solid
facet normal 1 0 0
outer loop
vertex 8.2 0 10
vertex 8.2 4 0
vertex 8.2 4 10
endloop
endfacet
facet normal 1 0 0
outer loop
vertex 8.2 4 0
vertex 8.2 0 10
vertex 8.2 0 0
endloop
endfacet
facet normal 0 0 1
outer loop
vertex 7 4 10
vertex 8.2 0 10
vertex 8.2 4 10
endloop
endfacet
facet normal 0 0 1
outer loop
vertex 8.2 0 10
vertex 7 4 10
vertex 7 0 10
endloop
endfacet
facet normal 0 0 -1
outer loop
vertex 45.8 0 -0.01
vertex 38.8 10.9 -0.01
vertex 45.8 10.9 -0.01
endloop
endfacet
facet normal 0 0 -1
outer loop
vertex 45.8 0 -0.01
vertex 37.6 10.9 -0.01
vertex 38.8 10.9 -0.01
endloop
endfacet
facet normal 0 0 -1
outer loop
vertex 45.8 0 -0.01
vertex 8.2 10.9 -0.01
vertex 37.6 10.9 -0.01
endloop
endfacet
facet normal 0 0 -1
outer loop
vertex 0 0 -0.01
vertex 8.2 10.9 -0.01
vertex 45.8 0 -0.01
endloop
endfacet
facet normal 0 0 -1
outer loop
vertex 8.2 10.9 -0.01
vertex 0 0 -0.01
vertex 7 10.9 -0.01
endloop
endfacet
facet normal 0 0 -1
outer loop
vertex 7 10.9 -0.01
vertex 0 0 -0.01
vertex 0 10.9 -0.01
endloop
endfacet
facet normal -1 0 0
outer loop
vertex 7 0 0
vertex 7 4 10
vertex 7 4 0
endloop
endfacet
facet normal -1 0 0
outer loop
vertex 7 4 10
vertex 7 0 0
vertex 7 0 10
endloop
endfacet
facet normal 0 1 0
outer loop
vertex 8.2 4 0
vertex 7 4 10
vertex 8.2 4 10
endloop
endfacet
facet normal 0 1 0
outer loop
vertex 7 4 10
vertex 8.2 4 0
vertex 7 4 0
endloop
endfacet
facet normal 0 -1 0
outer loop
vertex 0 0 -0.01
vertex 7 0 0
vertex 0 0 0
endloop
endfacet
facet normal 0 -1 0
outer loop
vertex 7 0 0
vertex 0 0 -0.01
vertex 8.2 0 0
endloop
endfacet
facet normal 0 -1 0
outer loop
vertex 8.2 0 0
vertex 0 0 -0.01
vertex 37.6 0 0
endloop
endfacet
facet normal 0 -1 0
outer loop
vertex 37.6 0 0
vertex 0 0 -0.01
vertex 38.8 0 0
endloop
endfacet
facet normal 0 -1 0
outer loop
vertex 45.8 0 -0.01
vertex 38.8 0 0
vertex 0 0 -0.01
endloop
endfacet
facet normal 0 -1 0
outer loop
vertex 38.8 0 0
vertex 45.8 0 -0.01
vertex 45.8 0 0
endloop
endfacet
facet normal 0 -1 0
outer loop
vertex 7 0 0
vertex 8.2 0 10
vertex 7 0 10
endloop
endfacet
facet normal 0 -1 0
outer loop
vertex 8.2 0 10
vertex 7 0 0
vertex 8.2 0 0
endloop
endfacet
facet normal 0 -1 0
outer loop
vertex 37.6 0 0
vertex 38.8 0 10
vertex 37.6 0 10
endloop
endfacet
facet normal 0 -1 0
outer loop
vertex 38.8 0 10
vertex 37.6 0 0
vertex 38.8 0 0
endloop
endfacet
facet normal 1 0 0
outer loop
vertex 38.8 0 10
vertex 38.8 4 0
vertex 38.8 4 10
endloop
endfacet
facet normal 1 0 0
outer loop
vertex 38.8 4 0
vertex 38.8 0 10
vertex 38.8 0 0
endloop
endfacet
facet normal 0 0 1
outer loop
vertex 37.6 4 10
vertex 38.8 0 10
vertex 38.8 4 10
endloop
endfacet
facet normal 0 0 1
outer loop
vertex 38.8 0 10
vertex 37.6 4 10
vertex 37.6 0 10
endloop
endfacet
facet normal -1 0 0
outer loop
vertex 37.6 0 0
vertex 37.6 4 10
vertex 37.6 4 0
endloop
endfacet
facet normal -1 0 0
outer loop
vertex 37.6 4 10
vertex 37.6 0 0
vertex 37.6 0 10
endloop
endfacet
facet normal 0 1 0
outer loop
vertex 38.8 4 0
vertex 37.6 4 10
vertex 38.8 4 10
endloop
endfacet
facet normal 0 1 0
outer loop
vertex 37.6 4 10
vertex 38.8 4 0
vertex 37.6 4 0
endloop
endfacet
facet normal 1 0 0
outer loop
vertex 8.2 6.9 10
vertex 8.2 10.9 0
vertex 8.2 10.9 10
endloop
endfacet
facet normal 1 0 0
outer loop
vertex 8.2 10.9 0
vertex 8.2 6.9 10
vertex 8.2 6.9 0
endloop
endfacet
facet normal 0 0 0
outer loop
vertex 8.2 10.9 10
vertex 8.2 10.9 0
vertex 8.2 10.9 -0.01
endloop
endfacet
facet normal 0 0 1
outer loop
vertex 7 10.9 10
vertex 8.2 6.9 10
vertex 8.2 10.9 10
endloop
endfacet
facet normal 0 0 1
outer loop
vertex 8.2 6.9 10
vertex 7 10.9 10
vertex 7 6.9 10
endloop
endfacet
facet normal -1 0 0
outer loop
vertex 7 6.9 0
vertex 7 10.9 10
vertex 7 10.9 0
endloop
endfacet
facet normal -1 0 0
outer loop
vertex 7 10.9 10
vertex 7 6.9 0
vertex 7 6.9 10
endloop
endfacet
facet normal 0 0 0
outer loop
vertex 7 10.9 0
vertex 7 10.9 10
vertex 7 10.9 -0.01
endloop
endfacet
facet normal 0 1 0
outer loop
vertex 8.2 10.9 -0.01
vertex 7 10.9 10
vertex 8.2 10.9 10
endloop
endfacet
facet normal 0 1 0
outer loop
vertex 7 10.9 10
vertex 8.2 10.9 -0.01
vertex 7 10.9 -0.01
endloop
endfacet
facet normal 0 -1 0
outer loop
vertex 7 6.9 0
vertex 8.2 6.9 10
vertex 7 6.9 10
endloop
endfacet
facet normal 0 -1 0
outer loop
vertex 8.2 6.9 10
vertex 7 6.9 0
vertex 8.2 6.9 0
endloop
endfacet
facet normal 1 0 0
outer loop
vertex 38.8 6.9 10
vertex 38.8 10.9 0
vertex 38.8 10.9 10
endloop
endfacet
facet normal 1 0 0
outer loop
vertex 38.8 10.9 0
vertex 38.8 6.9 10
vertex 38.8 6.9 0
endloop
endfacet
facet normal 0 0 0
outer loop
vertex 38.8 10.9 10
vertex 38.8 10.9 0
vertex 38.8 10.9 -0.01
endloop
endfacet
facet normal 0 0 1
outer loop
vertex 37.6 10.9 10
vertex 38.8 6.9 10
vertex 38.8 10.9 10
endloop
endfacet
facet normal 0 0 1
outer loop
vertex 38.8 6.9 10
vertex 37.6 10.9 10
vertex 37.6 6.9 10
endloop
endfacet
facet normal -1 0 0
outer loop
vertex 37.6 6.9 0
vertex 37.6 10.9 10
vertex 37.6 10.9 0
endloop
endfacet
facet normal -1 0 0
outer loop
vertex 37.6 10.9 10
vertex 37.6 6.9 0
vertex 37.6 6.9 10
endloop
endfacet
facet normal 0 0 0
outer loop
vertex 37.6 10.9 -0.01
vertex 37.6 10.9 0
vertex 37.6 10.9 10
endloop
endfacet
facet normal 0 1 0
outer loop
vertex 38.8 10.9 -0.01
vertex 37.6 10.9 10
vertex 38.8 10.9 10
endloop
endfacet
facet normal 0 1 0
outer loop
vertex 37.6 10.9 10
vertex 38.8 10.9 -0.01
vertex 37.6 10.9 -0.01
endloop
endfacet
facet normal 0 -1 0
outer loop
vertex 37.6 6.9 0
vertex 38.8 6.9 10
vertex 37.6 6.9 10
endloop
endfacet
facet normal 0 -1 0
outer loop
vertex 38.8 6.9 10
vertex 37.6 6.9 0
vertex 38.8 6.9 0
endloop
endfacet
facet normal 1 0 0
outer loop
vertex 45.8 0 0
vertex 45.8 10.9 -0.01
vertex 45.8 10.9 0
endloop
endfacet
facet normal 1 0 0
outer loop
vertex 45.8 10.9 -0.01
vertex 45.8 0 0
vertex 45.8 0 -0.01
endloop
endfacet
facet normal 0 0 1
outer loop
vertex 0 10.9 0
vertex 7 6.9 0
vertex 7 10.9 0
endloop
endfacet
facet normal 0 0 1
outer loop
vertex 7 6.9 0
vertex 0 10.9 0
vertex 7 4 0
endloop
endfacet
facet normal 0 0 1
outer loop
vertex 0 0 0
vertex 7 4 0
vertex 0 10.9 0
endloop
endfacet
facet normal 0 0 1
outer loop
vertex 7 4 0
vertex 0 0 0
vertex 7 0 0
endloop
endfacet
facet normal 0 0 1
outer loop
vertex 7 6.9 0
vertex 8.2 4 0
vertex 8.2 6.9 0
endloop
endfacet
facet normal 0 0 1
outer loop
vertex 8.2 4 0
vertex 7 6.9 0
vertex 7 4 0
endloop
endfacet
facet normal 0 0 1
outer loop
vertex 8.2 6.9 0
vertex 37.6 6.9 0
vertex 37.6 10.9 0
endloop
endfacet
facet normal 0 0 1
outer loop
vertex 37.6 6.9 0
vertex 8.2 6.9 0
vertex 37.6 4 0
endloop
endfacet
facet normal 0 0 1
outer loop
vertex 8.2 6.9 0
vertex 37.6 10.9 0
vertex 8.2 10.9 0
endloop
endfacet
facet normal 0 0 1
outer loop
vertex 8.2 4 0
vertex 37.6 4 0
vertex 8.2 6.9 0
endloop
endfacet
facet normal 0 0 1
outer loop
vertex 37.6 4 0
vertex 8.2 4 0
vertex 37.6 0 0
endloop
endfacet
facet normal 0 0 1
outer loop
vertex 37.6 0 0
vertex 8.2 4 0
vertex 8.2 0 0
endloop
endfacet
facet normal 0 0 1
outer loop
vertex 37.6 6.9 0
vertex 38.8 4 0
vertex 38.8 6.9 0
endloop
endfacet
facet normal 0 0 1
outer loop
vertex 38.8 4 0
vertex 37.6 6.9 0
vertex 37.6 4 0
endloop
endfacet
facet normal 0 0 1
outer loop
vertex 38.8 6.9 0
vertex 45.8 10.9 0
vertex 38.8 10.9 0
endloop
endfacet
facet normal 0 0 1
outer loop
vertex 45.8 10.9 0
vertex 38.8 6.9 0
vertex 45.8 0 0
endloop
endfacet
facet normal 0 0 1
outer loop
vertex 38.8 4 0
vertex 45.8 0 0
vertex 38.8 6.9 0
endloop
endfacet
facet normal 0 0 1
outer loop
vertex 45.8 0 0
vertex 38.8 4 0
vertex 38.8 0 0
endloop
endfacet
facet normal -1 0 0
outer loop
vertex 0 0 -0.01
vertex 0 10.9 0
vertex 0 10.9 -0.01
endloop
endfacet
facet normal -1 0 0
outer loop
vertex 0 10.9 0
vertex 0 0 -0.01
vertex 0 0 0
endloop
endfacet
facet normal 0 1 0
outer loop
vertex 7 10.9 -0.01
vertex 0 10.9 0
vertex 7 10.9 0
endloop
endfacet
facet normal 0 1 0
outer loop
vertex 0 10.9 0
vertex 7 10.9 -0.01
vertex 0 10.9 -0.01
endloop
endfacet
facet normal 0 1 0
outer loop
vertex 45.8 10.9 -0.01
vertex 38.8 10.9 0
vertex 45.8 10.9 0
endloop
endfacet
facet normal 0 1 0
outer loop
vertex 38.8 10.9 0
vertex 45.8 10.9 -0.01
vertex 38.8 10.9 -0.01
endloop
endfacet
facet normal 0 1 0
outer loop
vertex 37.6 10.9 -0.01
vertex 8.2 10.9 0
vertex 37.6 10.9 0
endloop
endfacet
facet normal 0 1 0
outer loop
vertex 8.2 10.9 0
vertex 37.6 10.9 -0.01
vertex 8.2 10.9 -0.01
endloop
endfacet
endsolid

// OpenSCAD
// file: ../Base/Boxes.scad
// Fischertechnik Box Foundation
// Pre-designed Boxes

use <Constants.scad>

include <PlacementOptions.scad>

box190Width = 190;
box190Depth = 130;
box130Width = 130;
box130Depth = 95;
boxUsageHeight = 33.9;
boxWallThickness = 2.4;
boxBaseThickness = 1.0;
boxWebWidth = 3.0;

// getBoxWallThickness()
// Gets the wall thickness of a Fischertechnik Box

function getBoxWallThickness() = boxWallThickness;

// Gets the usable height of a fischertechnik box
function getBoxUsageHeight() = boxUsageHeight;

// Gets the thickness of the Fischertechnik box base.
function getBoxBaseThickness() = boxBaseThickness;

// Gets the width of a box web
function getBoxWebWidth() = boxWebWidth;

// Gets the usable inner space of a Box 190 as an x/y-list
function getBox190Space() = [
    box190Width - 2*getBoxWallThickness(), 
    box190Depth - 2*getBoxWallThickness() ];

// Imports the Fischertechnik empty box 130x190 mm and places it at position 0,0
// 190x130 are the outer sizes, the inner space is slightly smaller. Use getBox190Space() to get the inner sizes.
// This module needs the STL file "Fischertechnik Box 130x190.stl" in the library path.
// The box is positioned that the usable inner space is at the 0,0,0 position. The

module Box190() {
    translate([-getBoxWallThickness(),-getBoxWallThickness(),-getBoxBaseThickness()])
        import("Fischertechnik Box 130x190.stl", convexity=3);
}

// Gets the usable inner space of a Box 130 as an x/y-list
function getBox130Space() = [
    box130Width - 2*getBoxWallThickness(), 
    box130Depth - 2*getBoxWallThickness() ];

// Imports the Fischertechnik empty box 95x130 mm and places it at position 0,0
// 190x130 are the outer sizes, the inner space is slightly smaller. Use getBox190Space() to get the inner sizes.
// This module needs the STL file "Fischertechnik Box 95x130.stl" in the library path.
// The box is positioned that the usable inner space is at the 0,0,0 position. The

module Box130() {
    translate([-getBoxWallThickness(),-getBoxWallThickness(),-getBoxBaseThickness()])
        import("Fischertechnik Box 95x130.stl", convexity=3);
}

// Creates a web at the specified box walls
// corner 0 = LowerLeft, 1 = UpperLeft, 2 = UpperRight, 3 = LowerRight
// side 0 = LeftOfCorner, 1 = RightOfCorner
// distance = Distance in mm from the corner
// box = inner width and depth of the box (default: Box 190)
// webWidth = length of the web (default is 3 mms)
// webThickness = thickness of the web (default is 1 mm)

module BoxWeb(corner, side, distance, box=getBox190Space(), webWidth=getBoxWebWidth(), webThickness=1.0) {
    sink = getBoxWallThickness()/2;

    width = (corner % 2 == 0) ? 
            (side == LeftOfCorner ? webWidth : webThickness) :
            (side == LeftOfCorner ? webThickness : webWidth);

    depth = (corner % 2 == 0) ? 
            (side == RightOfCorner ? webWidth : webThickness) :
            (side == RightOfCorner ? webThickness : webWidth);
    
    xDiff = corner == LowerLeft ? 
                (side == LeftOfCorner ? -sink : distance) :
            (corner == UpperLeft ?                
                (side == LeftOfCorner ? distance : -sink) :
            (corner == UpperRight ?
                (side == LeftOfCorner ? box.x-webWidth+sink : box.x-distance-webThickness) :
                (side == LeftOfCorner ? box.x-distance-webThickness: box.x-webWidth+sink)));

    yDiff = corner == LowerLeft ? 
                (side == RightOfCorner ? -sink : distance) :
            (corner == UpperLeft ?
                (side == RightOfCorner ? box.y-distance : box.y-webWidth+sink) :
            (corner == UpperRight ?
                (side == RightOfCorner ? box.y-webWidth+sink : box.y-distance) :
                (side == RightOfCorner ? distance : -sink)));
    
    translate([xDiff, yDiff, -getExcess()])
        cube([width, depth, boxUsageHeight + 2*getExcess()]);
}
// file: ../Base/Rotation.scad
// Fischertechnik Box Foundation
// Geometry Helpers Rotation

include <PlacementOptions.scad>

// getRotatedSpace(space, rotation=NoRotation)
// Rotates the space dependent on the specified rotation

function getRotatedSpace(space, rotation=NoRotation) = [
    (rotation == Rotate90 || rotation == Rotate270) ? space.y : space.x,
    (rotation == Rotate90 || rotation == Rotate270) ? space.x : space.y
];

// Rotates the given space around the fixed left lower corner
// space = the space the children needs as width/depth list [width,depth]
// rotation = 0 Rotate0 degrees, 1 Rotate90 degrees, 2 Rotate180 degrees, 3 Rotate270 degrees (equivalent to -90)

module RotateFix(space, rotation=Rotate0) {
    dy = (rotation == Rotate0 || rotation == Rotate270) ? 0 :
        (rotation == Rotate90) ? space.x :
        space.y;
    dx = (rotation < Rotate180) ? 0 :
        (rotation == Rotate180) ? space.x :
        space.y;
    
    translate([dx, dy, 0])
        rotate([0, 0, rotations[rotation]])
            children();
}
// file: ../Base/Alignment.scad
// Fischertechnik Box Foundation
// Geometry Helpers Alignment

include <PlacementOptions.scad>

// getAlignedX(elementWidth, spaceWidth, align=AlignRight, offset=0)
// Gets the aligned X offset of an element with the given
// width in the given space.
// elementWidth = The width of the element to positon
// spaceWidth = The space where the element should be aligned
// align = 0 AlignLeft, 1 AlignCenter, 2 AlignRight
// offset = an optional offset from the aligned position. When
// aligned left or centered, then positive values are in X direction.
// When aligned right then positive values are in negative X direction.

function getAlignedX(elementWidth, spaceWidth, align=AlignRight, offset=0) =
    (align == AlignLeft) ?
        offset :
        ((align == AlignCenter) ?
        (spaceWidth - elementWidth)/2 + offset :
        spaceWidth - offset - elementWidth);

// getAlignedY(elementDepth, spaceDepth, align=AlignTop, offset=0)
// Gets the aligned Y offset of an element with the given
// depth in the given space.
// elementDepth = The depth of the element to positon
// spaceDepth = The space where the element should be aligned
// align = 0 AlignBottom, 1 AlignCenter, 2 AlignTop
// offset = an optional offset from the aligned position. When
// aligned bottom or centered, then positive values are in Y direction.
// When aligned top then positive values are in negative Y direction.

function getAlignedY(elementDepth, spaceDepth, align=AlignTop, offset=0) =
    (align == AlignBottom) ?
        offset :
        ((align == AlignCenter) ?
        (spaceDepth - elementDepth)/2 + offset :
        spaceDepth - offset - elementDepth);
// file: ../Base/PlacementOptions.scad
// Fischertechnik Box Foundation
// Placement Options

// Alignment
NoAlign = 0;
AlignLeft = 1;
AlignBottom = 2;
AlignCenter = 3;
AlignRight = 4;
AlignTop = 5;

// Element rotation degree steps
rotations = [0, -90, -180, -270];

// Rotation
NoRotation = 0;
Rotate0 = 0;
Rotate90 = 1;
Rotate180 = 2;
Rotate270 = 3;

// Docking (seen from above)
NoDock = -1;
DockLeft = 0;
DockTop = 1;
DockRight = 2;
DockCorner = 2;
DockBottom = 3;

// Web corners
LowerLeft = 0;
UpperLeft = 1;
UpperRight = 2;
LowerRight = 3;

// Web position relative to corner
LeftOfCorner = 0;
RightOfCorner = 1;
// file: ../Base/Placement.scad
// Fischertechnik Box Foundation
// Geometry Helpers Placement

use <Constants.scad>
use <Alignment.scad>
use <Rotation.scad>
use <Boxes.scad>

include <PlacementOptions.scad>

// Place(x=0, y=0, elementSpace=[0,0], alignX=AlignLeft, alignY=AlignBottom, rotation=Rotate0, boxSpace=getBox190Space())
// Places the child at the specified position
// y = Y-Position. This is a relative position when an X aligment is specified.
// x = X-Position. This is a relative position when an Y aligment is specified.
// elementSpace = space of the element to be placed [x,y]
// alignX = -1=NoAlign, 0 AlignLeft, 1 AlignCenter, 3 AlignRight (elementSpace and boxSpace required!)
// alignY = -1=NoAlign, 2 AlignBottom, 1 AlignCenter, 4 AlignTop (elementSpace and boxSpace required!)
// rotation = 0 Rotate0 0 degrees, 1 Rotate90 90 degrees, 
// 2 Rotate180 180 degrees, 3 Rotate270 270 degrees (equivalent to -90)
// boxSpace = Inner space of the box where the placement occurs [x,y] - default is Box 190x130 inner space

module Place(x=0, y=0, elementSpace=[0,0], 
  alignX=AlignLeft, alignY=AlignBottom, 
  rotation=NoRotation, boxSpace=getBox190Space()) {

    module Position(x, y, space, rotation=Rotate0) {
        translate([x, y, 0])
            RotateFix(space, rotation)
                children();
    }

    space = getRotatedSpace(elementSpace, rotation);
    alignedX = getAlignedX(space.x, boxSpace.x, alignX, x);
    alignedY = getAlignedY(space.y, boxSpace.y, alignY, y);
    Position(alignedX, alignedY, elementSpace, rotation)
        children();
}

// Center(space=getBox130Space(), elementSpace=[0,0])
// space = Space where the children is centered. For cylinder use centered=true and no elementSpace.
// elementSpace = space of the element to be centered [x,y]

module Center(space=getBox190Space(), elementSpace=[0,0]) {
    translate([(space.x - elementSpace.x) / 2, (space.y - elementSpace.y) / 2])
        children(0);
}

// CenterHorizontal(width=0, y=0, offset=0, space=getBox130Space())
// space = Space where the children is centered. For cylinder use centered=true and no elementSpace.
// elementSpace = space of the element to be centered [x,y]

module CenterHorizontal(width=0, y=0, offset=0, space=getBox190Space()) {
    translate([(space.x - width) / 2 + offset, y])
        children(0);
}

// CenterVertical(depth=0, x=0, offset=0, space=getBox130Space())
// space = Space where the children is centered. For cylinder use centered=true and no elementSpace.
// elementSpace = space of the element to be centered [x,y]

module CenterVertical(depth=0, x=0, offset=0, space=getBox190Space()) {
    translate([x, (space.y - depth) / 2 + offset])
        children(0);
}
// file: ../Base/Constants.scad
// Fischertechnik Box Foundation
// Constants

// Constant values necessary for multiple elements

// Base constants
dividerThickness = 1.2;
excess = 0.01;
fragments = 90;
tolerance = 0.8;

// Gets the thickness of a divider 
function getDividerThickness() = dividerThickness;

// Gets the excess that is used to merge walls into each other
function getExcess() = excess;

// Gets amount of fragments of a cylinder
function getFragments() = fragments;

// Gets the inner tolerance of a frame to each side
function getTolerance() = tolerance;


// Fischertechnik specific constants
axisDiameter = 4;
axisBottomDiameter = axisDiameter + 1;
standardEdgeDistance = 2.5;
standardWebDistance = 11.5;
standardCornerLength = 15;
tubeWallFactor = 0.8;

// Gets axis diameter
function getAxisDiameter() = axisDiameter;

// Gets axis bottom diameter for thicker part at the bottom
function getAxisBottomDiameter() = axisBottomDiameter;

// gets the standard distance to the wall of the box for dockable frames with webs
function getStandardEdgeDistance() = standardEdgeDistance;

// gets the standard distance of each web to the corner of the dockable frame
function getStandardWebDistance() = standardWebDistance;

// gets the standard length of the corner walls of a dockable frame
function getStandardCornerLength() = standardCornerLength;

// gets the wall thickness of a tube.
function getTubeWallThickness() = tubeWallFactor * getDividerThickness();
// main file
// Fischertechnik Box Library
// Holder for Building Plate 45x30
// 38259

use <../ModelBase/Complex.scad>

width = 45;

// getHolderBuildingPlate45x30Space(count = 1)
// Gets the width (.x) and depth (.y) space the holder needs.

function getHolderBuildingPlate45x30Space(count = 1) = getHolderBuildingPlateSpace(width, count);

// HolderBuildingPlate45x30(count=1, dock=false)
// Holder for building plates 45x30
// count = Count of building plates (default 1)
// dock = true if the holders are docked to the box wall (default false) 

module HolderBuildingPlate45x30(count = 1, dock = false) {
    HolderBuildingPlate(width, count, firstGapHigher = dock);
}

// Test
color("lightgray")
HolderBuildingPlate45x30();
